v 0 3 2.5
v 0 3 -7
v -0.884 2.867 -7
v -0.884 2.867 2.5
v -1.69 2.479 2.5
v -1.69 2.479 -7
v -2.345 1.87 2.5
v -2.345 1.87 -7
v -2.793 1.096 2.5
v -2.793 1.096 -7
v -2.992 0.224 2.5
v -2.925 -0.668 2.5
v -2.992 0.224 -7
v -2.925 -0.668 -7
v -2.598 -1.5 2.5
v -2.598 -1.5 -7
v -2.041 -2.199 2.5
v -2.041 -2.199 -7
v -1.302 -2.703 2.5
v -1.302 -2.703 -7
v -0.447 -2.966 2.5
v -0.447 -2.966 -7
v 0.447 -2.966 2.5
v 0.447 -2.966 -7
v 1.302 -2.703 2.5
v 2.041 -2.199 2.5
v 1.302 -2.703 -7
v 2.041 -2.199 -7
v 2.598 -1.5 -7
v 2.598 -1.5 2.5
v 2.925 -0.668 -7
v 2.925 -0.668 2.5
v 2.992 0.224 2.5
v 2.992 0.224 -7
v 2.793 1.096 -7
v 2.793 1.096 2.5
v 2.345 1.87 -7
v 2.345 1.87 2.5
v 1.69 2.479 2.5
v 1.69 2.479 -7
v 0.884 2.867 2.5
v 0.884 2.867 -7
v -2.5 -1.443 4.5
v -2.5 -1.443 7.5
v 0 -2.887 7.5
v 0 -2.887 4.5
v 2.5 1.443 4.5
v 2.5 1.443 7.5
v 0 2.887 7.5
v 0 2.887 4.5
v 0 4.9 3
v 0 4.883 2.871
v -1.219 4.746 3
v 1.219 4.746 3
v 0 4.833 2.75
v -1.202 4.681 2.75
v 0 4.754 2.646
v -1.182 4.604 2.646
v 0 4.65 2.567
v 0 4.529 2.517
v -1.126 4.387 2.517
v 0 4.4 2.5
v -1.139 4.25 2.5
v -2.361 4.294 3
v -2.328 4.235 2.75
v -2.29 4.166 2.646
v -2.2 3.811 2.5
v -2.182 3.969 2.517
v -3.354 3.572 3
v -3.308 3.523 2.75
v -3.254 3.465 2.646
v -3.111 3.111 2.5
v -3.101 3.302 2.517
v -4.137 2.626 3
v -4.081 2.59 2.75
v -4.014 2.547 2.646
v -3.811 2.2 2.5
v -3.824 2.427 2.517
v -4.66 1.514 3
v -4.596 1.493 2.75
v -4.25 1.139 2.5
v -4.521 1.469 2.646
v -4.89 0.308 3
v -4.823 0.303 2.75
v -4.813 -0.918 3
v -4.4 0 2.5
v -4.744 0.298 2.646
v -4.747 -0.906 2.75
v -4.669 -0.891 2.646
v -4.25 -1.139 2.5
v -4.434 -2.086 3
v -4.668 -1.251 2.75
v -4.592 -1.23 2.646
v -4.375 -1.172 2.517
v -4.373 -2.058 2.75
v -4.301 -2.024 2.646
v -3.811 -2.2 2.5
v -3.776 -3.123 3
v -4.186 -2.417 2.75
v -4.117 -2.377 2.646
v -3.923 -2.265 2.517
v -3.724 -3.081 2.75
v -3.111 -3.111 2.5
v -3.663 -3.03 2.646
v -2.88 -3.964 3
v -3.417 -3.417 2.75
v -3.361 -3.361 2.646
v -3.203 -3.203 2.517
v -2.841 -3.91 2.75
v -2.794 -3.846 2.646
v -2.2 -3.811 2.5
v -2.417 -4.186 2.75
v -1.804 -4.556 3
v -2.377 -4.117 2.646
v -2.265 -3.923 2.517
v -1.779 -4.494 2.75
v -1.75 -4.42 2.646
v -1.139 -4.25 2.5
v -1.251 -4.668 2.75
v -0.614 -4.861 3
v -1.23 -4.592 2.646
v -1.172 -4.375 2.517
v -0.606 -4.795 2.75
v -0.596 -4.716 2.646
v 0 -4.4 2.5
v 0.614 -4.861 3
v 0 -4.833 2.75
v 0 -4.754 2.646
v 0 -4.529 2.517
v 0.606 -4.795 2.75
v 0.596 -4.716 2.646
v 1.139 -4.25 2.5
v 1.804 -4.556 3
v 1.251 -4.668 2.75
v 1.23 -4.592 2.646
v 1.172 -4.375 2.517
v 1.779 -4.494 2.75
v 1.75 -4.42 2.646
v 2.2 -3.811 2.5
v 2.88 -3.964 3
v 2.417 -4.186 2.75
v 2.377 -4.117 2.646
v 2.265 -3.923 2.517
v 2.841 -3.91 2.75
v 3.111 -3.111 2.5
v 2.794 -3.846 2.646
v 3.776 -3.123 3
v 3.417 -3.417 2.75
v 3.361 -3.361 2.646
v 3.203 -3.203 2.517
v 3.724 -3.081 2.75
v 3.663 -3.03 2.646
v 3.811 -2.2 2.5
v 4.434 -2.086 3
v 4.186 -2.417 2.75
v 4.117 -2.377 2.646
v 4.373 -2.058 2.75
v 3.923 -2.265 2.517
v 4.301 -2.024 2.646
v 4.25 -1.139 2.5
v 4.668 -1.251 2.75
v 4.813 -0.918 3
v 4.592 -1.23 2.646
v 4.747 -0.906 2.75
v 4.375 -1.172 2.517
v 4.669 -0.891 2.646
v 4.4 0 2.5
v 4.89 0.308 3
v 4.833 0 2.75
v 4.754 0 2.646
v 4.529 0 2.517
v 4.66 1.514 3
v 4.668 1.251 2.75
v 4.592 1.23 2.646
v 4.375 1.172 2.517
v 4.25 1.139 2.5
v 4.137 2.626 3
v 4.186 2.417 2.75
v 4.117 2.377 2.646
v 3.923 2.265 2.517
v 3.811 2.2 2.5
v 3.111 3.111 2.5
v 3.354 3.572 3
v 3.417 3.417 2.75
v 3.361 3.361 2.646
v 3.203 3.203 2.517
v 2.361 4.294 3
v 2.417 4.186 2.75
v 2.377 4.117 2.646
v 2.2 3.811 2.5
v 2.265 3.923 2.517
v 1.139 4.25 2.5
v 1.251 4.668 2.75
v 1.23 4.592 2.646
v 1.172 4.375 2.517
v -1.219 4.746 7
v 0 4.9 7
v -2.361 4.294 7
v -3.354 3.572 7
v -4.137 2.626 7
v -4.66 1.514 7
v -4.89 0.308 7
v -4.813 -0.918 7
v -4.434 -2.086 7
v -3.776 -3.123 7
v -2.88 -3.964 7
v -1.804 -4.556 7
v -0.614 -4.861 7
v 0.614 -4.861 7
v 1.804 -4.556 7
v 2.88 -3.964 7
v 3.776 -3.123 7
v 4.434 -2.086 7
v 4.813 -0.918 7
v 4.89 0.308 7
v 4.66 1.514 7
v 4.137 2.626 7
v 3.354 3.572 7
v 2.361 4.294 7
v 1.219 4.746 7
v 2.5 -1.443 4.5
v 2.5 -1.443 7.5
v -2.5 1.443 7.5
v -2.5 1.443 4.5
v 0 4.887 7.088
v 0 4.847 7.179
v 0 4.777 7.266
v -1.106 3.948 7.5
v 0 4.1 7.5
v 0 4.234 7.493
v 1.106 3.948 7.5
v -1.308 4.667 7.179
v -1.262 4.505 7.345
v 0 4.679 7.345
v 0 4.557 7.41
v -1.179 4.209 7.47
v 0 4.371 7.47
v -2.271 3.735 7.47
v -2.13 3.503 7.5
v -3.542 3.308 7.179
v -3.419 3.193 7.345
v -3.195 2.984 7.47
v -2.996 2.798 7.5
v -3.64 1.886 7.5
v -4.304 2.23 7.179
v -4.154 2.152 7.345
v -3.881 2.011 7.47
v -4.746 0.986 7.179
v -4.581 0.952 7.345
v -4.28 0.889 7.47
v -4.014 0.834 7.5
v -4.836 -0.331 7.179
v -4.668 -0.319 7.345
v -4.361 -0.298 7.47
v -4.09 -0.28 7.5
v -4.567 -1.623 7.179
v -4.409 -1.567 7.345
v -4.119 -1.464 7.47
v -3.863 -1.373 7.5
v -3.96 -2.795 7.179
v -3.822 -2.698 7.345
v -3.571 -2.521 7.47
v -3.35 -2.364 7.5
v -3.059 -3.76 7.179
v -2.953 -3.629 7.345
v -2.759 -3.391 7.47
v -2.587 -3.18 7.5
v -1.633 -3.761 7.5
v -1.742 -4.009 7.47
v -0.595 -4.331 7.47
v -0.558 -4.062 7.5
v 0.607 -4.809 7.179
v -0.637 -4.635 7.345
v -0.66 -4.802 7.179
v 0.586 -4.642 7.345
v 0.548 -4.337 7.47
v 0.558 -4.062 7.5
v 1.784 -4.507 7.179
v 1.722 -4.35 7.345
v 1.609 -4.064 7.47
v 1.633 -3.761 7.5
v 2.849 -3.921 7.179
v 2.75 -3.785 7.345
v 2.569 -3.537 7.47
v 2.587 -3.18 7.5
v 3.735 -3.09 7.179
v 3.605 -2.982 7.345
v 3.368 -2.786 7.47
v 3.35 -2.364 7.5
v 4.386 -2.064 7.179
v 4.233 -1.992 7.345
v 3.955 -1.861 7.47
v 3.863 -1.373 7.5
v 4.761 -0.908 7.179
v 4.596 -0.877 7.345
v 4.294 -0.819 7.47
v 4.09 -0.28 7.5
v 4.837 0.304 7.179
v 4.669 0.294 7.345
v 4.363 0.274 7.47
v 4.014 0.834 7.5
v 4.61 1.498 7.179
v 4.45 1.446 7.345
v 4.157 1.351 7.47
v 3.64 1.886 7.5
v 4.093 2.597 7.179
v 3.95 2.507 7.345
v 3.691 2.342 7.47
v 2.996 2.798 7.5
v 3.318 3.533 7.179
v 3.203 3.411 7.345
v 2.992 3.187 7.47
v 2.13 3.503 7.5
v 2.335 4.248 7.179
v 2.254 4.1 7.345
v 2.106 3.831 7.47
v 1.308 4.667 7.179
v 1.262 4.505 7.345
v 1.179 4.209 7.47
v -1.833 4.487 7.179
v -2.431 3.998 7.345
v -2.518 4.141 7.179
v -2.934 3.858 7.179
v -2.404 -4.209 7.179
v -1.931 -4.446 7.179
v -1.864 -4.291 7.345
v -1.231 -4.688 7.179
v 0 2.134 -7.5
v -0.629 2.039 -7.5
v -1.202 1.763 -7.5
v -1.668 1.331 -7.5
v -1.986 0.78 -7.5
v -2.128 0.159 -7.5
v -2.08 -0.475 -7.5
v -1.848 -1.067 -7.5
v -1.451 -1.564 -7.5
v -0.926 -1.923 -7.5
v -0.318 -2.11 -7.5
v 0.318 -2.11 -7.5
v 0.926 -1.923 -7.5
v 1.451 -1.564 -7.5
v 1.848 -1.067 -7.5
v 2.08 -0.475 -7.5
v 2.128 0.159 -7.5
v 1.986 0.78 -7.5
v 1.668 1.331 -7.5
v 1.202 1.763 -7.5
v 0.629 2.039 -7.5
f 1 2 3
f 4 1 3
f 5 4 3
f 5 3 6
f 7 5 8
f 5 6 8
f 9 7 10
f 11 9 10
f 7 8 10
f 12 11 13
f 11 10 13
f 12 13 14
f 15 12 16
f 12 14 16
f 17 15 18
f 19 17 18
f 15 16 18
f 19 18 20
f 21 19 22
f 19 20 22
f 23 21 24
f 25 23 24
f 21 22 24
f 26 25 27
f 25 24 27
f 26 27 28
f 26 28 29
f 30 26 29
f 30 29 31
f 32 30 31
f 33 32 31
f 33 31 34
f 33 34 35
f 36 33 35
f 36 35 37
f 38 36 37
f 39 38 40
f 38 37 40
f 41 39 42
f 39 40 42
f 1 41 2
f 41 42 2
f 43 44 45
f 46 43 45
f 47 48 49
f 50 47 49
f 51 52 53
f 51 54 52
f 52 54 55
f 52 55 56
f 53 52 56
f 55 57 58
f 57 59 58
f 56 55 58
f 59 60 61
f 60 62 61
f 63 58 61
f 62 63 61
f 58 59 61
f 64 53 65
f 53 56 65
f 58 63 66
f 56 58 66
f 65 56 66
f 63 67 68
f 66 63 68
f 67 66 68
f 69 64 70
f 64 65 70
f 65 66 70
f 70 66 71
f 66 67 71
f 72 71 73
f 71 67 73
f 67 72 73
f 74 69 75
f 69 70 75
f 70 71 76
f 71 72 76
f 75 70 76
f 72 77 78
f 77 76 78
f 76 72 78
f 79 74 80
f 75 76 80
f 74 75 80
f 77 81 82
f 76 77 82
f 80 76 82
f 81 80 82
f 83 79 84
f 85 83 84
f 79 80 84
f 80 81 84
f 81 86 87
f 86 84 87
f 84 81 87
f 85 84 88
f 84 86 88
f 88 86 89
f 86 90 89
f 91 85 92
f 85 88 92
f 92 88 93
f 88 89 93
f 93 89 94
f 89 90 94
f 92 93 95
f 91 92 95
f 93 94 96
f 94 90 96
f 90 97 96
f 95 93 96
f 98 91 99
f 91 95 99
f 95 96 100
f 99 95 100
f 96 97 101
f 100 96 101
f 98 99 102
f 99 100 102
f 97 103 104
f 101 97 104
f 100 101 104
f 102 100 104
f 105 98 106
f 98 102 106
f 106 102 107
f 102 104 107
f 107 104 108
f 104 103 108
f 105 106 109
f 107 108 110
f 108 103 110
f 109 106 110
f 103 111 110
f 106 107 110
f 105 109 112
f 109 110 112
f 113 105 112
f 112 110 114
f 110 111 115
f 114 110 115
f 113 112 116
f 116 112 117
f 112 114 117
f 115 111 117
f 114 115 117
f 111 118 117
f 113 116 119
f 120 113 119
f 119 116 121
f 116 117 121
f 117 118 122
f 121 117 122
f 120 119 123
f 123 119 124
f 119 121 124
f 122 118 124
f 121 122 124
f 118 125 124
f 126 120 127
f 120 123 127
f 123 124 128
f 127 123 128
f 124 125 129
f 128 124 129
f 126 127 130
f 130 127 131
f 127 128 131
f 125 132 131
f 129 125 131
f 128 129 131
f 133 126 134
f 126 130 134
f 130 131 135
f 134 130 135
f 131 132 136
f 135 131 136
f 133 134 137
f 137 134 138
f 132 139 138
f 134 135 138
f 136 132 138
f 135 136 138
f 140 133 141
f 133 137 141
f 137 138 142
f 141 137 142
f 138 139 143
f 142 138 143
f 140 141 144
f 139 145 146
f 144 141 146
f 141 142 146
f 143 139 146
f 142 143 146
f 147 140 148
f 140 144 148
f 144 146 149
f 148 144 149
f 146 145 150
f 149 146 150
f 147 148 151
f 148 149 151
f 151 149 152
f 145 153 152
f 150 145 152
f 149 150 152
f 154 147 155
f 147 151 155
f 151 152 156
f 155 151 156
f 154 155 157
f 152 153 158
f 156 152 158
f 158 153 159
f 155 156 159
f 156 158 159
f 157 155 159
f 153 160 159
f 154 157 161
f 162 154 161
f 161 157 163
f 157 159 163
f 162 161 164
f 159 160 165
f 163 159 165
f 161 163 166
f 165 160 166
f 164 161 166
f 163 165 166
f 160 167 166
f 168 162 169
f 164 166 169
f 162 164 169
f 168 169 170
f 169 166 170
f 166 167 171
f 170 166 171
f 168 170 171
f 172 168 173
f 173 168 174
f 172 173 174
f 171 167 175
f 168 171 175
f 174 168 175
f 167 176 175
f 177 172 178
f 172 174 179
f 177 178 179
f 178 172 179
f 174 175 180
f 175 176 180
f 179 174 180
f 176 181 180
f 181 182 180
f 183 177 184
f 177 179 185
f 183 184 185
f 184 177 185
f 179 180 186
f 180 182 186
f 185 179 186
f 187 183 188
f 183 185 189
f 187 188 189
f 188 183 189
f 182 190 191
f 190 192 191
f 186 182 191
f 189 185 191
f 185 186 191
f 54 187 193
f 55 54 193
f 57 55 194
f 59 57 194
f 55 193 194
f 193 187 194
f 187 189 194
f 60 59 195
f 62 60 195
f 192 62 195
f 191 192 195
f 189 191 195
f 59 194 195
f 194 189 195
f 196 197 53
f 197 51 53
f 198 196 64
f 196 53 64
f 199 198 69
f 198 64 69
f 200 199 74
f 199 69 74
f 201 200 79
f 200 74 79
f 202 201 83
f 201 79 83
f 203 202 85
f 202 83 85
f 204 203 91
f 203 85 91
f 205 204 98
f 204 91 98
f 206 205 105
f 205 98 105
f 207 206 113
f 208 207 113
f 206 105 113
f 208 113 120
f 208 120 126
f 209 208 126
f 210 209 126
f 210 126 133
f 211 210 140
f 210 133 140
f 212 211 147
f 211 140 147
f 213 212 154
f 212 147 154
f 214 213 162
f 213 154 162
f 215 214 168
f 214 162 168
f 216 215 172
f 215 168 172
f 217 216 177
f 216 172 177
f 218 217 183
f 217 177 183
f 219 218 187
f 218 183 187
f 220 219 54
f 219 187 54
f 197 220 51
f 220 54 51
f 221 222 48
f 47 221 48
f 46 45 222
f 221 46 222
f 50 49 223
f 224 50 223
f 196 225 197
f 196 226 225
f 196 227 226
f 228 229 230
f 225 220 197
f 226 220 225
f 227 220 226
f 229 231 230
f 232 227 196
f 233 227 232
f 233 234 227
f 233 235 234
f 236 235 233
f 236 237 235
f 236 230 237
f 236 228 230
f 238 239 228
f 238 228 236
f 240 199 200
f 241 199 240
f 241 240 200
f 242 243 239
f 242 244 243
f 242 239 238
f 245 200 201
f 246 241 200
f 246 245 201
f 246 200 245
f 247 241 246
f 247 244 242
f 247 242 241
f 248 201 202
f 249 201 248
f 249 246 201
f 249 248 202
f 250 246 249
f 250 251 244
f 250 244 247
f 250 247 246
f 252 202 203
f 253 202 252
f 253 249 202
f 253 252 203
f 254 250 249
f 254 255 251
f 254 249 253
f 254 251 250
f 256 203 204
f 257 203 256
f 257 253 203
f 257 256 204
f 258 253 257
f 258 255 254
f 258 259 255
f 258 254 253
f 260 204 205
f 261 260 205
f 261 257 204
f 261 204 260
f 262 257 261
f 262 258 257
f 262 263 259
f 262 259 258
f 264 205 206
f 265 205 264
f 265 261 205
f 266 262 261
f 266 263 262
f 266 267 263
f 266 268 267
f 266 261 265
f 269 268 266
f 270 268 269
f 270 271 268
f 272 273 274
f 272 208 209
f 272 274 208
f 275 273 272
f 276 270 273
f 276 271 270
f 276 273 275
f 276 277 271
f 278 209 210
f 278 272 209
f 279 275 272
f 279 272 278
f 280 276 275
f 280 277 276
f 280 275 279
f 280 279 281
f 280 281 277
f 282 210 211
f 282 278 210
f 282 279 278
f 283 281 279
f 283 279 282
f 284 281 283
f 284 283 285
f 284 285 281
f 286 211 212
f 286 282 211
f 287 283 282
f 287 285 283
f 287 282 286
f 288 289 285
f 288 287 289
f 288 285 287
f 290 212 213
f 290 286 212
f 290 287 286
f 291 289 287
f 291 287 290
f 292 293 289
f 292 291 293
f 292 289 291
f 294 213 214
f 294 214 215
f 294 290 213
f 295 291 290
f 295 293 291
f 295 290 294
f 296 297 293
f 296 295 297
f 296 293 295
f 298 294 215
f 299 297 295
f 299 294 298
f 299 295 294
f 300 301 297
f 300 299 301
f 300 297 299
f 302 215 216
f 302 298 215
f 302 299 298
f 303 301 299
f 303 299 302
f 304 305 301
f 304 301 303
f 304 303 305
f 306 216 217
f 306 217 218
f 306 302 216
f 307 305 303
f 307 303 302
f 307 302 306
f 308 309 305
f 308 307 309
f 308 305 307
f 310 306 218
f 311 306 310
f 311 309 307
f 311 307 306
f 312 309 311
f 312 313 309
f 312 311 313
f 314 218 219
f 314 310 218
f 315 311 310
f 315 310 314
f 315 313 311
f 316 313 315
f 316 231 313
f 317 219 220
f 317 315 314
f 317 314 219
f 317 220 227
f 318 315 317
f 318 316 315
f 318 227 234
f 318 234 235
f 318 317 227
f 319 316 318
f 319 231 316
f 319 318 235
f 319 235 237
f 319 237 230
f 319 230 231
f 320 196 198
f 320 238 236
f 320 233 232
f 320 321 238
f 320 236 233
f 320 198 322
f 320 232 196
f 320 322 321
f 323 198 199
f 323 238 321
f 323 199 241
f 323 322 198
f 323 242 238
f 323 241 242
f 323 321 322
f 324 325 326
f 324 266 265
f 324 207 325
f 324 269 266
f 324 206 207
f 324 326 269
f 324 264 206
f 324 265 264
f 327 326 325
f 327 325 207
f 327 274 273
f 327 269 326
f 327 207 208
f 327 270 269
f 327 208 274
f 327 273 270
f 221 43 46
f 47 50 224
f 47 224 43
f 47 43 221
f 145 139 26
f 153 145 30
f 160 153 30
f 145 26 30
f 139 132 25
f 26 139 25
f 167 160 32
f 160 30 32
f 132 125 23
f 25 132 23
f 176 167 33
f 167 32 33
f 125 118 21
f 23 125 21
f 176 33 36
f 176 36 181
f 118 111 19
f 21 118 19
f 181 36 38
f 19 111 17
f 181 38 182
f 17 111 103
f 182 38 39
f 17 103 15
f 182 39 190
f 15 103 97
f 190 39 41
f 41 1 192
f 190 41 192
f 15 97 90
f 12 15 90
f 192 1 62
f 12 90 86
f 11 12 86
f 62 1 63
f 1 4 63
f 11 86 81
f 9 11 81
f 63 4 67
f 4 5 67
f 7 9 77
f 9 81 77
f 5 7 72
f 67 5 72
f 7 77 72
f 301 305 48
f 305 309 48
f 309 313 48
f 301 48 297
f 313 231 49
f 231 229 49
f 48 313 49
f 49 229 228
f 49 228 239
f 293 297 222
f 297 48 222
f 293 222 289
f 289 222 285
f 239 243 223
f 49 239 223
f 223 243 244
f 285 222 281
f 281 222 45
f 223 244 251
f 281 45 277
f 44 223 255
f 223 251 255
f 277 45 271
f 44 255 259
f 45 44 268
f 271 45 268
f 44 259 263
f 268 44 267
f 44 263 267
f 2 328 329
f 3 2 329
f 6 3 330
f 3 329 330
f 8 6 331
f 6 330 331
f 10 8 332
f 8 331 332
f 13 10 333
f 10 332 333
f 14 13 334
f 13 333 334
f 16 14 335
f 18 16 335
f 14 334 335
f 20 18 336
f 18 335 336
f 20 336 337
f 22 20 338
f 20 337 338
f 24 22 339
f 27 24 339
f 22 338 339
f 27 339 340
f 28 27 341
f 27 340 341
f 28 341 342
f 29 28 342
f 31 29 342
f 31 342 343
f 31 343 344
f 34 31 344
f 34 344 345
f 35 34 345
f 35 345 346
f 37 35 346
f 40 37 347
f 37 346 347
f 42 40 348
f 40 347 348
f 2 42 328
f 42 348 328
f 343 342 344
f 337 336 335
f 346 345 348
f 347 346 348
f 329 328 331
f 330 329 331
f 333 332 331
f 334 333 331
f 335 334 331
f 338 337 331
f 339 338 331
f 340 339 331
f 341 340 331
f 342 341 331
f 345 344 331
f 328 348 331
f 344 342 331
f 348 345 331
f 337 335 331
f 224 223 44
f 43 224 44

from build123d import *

# Parameters (mm, degrees)
FILLET_1_R          = 0.5
FILLET_2_SIZE       = 0.5
FILLET_2_SIZE_2     = 0.8
CHAMFER_1_SIZE      = 0.5
CHAMFER_1_SIZE2     = 0.866025404
CUT_EXTRUDE_1_DEPTH = 3


with BuildPart() as part:
    # 草图2 → 旋转1 (revolve)
    with BuildSketch(Plane(origin=(0, 0, 0), x_dir=(0, 0, -1), z_dir=(1, 0, 0))):
        Polygon((-7.5, 0), (-7.5, 4.9), (-2.5, 4.9), (-2.5, 3), (7.5, 3), (7.5, 0), align=None)
    revolve(axis=Axis((0, 0, -7.5), (0, 0, 1)))

    # 圆角1
    fillet_1_edges = [part.edges().sort_by_distance(p)[0] for p in [
        (0, -4.9, 2.5),
    ]]
    fillet(fillet_1_edges, radius=FILLET_1_R)

    # 圆角2
    # an asymmetric fillet: 0.8, 0.5 mm, written as the material it takes off along each edge
    with BuildSketch(Plane(origin=(0, 0, 7.5), x_dir=(0, 1, 0), z_dir=(1, 0, 0))) as fillet_2_piece_1:
        with BuildLine():
            Bezier((4.9, -FILLET_2_SIZE), (4.9, 0), (4.9 - FILLET_2_SIZE_2, 0), weights=[1, 0.707106781, 1])
            Line((4.9 - FILLET_2_SIZE_2, 0), (4.9, 0))
            Line((4.9, 0), (4.9, -FILLET_2_SIZE))
        make_face()
    revolve(axis=Axis((0, 0, 7.5), (0, 0, 1)), mode=Mode.SUBTRACT)

    # 倒角1
    chamfer_1_edges = [part.edges().sort_by_distance(p)[0] for p in [
        (0, -3, -7.5),
    ]]
    chamfer_1_side = [part.faces().sort_by_distance(p)[0] for p in [
        (0, -3, -2.5),
    ]]
    chamfer(chamfer_1_edges, length=CHAMFER_1_SIZE, length2=CHAMFER_1_SIZE2, reference=chamfer_1_side[0])

    # 草图3 → 切除-拉伸1 (cut)
    with BuildSketch(Plane.XY.offset(7.5)):
        Polygon((0, 2.886751346), (-2.5, 1.443375673), (-2.5, -1.443375673), (0, -2.886751346), (2.5, -1.443375673), (2.5, 1.443375673), align=None)
    extrude(amount=-CUT_EXTRUDE_1_DEPTH, mode=Mode.SUBTRACT)


solid = part.part
